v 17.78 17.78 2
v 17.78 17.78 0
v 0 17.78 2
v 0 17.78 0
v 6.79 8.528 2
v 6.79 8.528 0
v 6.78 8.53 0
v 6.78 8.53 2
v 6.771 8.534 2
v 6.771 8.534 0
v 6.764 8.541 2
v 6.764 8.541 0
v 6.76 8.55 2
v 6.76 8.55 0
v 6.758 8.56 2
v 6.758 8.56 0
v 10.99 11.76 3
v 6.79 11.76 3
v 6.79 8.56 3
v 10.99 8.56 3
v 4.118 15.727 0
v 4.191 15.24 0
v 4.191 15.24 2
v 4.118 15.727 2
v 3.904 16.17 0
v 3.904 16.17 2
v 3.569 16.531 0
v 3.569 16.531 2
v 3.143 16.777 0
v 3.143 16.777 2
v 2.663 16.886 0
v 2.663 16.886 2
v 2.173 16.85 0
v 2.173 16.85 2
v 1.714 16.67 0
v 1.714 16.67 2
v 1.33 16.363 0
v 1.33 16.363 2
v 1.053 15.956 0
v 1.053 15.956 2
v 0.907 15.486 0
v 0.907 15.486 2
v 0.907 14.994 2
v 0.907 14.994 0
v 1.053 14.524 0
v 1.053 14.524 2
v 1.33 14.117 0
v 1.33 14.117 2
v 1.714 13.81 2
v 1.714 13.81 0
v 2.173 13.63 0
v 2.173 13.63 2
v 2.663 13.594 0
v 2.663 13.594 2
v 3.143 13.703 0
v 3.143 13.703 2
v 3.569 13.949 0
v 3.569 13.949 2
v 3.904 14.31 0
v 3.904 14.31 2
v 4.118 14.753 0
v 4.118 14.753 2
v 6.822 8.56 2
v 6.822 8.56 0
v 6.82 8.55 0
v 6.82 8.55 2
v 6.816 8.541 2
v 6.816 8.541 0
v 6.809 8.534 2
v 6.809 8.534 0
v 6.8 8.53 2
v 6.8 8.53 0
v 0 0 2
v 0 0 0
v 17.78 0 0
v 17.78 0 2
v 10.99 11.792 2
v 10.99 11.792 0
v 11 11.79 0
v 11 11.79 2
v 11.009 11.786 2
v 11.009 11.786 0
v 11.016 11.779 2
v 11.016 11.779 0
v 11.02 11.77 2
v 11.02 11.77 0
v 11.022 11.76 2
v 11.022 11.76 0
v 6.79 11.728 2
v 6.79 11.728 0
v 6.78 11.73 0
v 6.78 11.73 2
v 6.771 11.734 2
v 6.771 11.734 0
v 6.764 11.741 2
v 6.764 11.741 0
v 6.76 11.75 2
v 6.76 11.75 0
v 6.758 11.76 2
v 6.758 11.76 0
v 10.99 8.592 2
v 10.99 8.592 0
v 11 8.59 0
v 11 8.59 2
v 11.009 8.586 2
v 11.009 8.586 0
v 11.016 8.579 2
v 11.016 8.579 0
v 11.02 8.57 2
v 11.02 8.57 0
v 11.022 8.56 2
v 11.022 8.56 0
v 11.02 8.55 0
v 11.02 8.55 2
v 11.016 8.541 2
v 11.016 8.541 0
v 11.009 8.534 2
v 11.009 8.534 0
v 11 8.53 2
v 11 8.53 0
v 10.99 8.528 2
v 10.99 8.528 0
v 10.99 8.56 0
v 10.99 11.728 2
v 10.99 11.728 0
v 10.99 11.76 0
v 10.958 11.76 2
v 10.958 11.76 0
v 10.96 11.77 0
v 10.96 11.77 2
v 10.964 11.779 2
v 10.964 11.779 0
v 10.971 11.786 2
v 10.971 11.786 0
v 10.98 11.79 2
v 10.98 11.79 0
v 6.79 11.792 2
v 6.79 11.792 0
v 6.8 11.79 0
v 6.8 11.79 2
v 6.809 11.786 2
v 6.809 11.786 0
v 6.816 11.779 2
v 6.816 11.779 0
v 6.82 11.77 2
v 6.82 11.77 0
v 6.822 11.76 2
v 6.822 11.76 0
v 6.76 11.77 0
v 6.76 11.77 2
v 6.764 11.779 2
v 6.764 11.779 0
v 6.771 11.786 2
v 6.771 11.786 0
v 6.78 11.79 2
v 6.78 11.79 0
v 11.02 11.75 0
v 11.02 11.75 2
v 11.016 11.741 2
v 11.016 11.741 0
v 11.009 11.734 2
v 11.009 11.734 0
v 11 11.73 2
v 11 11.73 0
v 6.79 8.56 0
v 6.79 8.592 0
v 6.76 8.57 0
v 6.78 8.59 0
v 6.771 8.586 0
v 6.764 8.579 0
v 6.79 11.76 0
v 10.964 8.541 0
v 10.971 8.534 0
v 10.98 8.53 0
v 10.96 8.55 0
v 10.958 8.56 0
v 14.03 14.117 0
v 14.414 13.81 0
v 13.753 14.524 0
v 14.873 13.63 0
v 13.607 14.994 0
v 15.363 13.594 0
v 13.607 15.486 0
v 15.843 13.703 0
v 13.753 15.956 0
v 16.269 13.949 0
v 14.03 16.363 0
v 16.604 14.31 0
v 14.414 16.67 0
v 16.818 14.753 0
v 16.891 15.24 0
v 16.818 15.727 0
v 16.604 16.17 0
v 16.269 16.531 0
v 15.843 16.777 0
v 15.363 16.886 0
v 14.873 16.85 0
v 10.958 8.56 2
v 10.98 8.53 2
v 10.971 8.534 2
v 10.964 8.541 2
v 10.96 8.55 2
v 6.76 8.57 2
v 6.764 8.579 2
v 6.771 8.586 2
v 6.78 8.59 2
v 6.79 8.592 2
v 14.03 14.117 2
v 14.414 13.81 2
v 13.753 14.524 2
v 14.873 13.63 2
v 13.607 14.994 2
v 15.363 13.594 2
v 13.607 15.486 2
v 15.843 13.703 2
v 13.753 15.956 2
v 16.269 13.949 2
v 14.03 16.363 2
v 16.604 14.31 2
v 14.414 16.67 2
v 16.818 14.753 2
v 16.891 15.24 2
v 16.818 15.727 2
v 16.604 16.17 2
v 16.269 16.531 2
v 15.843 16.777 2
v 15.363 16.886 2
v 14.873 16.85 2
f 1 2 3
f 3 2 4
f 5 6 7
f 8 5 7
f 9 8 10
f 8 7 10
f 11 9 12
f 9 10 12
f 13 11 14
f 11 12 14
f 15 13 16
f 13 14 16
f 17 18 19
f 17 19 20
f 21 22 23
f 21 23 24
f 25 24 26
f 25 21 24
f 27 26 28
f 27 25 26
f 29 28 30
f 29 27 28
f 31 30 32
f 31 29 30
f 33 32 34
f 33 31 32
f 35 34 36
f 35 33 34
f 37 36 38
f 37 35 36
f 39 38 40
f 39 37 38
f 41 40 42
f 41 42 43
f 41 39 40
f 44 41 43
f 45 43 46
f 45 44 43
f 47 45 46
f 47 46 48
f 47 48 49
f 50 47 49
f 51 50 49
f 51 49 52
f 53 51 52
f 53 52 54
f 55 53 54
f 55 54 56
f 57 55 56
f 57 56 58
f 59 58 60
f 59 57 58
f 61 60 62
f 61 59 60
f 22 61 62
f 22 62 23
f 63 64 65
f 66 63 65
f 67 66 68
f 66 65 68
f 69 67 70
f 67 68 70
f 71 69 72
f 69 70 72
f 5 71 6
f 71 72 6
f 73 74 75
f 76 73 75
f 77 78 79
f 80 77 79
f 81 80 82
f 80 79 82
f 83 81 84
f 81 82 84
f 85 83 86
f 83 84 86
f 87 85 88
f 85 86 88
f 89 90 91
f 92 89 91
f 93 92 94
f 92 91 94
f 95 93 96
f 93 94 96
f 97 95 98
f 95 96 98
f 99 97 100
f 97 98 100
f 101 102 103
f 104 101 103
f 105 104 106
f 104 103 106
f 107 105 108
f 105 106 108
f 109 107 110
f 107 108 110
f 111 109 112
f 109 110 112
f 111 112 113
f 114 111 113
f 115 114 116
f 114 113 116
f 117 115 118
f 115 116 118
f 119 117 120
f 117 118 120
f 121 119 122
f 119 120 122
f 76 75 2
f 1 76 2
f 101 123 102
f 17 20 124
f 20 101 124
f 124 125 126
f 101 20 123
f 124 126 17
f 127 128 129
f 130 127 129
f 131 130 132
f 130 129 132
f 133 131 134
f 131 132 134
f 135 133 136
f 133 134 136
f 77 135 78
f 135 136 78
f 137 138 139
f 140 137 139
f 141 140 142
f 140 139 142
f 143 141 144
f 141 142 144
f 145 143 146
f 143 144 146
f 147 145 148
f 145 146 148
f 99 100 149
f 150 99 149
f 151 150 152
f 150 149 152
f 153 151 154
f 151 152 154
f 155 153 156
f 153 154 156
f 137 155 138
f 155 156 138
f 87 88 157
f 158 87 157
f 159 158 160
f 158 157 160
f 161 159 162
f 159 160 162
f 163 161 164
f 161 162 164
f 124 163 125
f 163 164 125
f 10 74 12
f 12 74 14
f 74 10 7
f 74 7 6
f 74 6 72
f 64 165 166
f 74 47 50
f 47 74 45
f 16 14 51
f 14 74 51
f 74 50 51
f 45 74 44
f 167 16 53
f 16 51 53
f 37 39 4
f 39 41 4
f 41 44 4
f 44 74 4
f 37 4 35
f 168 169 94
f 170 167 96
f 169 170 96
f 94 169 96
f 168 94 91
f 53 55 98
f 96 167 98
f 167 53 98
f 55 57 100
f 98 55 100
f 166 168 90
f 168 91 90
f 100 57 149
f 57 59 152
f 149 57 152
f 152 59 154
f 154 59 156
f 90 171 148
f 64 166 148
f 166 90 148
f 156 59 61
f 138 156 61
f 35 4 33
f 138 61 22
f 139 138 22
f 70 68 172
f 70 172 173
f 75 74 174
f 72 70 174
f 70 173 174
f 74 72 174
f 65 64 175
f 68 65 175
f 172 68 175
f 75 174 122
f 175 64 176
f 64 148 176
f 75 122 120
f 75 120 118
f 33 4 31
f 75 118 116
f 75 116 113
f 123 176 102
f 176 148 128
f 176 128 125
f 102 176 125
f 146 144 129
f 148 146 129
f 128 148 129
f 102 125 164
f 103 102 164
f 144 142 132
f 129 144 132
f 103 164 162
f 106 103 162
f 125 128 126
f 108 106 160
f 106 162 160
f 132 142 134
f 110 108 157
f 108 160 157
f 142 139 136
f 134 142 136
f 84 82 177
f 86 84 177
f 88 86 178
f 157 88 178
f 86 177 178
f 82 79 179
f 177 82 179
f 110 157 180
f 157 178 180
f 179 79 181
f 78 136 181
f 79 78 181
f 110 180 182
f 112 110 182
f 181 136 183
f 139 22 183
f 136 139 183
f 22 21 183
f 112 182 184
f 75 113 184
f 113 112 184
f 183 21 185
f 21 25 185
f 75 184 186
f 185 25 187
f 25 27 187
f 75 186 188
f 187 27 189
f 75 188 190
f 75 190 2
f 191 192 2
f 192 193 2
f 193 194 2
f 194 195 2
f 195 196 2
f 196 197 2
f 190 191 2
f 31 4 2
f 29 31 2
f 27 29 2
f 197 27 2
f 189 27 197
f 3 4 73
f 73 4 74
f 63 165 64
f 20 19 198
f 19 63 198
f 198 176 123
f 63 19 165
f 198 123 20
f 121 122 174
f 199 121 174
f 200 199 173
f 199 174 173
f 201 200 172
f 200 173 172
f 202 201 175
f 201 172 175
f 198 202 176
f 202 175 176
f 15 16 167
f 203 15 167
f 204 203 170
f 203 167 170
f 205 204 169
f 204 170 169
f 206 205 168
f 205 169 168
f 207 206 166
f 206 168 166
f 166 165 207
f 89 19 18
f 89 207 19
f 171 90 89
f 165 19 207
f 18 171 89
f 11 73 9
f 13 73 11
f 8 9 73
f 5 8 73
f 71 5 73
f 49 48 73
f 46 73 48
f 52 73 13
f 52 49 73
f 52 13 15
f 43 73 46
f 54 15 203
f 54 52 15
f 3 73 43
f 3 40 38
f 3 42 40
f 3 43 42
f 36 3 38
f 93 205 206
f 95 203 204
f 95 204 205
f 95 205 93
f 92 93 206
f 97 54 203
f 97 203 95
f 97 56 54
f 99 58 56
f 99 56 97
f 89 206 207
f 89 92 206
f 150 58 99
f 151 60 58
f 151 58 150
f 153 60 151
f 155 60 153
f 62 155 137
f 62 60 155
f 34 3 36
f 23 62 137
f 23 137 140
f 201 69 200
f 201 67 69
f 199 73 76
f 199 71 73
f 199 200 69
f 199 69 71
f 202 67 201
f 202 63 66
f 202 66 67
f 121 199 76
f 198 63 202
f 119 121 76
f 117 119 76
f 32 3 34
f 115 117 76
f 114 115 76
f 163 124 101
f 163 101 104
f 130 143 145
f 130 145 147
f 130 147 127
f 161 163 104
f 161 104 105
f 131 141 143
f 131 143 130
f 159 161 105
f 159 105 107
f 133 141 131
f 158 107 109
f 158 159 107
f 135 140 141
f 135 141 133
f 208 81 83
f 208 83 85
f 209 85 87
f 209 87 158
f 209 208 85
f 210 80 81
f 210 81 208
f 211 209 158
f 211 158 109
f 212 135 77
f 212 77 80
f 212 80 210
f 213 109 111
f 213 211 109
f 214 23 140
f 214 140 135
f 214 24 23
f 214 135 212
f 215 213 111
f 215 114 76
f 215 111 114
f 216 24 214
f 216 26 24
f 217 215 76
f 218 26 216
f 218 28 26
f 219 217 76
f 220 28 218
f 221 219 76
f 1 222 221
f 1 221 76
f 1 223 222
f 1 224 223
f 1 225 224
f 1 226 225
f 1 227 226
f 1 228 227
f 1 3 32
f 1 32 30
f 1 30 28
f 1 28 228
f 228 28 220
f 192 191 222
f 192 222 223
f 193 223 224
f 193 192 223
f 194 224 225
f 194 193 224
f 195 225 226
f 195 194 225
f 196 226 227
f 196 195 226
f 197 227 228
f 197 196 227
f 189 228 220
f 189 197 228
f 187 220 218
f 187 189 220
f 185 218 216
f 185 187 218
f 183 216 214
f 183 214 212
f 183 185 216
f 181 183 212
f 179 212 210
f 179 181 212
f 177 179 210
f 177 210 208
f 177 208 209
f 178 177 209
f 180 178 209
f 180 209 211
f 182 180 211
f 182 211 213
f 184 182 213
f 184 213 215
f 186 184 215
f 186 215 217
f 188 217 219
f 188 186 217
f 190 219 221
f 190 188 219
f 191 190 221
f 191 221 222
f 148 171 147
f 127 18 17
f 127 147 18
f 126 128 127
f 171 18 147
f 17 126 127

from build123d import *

# Parameters (mm, degrees)
MODEL_W             = 17.78
MODEL_H             = 17.78
MODEL_R             = 1.651
BOSS_EXTRUDE1_DEPTH = 2
BOSS_EXTRUDE2_DEPTH = 3


with BuildPart() as part:
    # Model → Boss-Extrude1 (new body)
    with BuildSketch(Plane.XY):
        with Locations((8.89, 8.89)):
            Rectangle(MODEL_W, MODEL_H)
        with Locations((2.54, 15.24)):
            Circle(MODEL_R, mode=Mode.SUBTRACT)
        with BuildLine():
            Line((10.9582458, 8.5600032), (10.9899958, 8.5600032))
            Line((10.9899958, 8.5600032), (10.9899958, 8.5917532))
            ThreePointArc((10.9899958, 8.5917532), (11.01244644, 8.53755256), (10.9582458, 8.5600032))
        make_face(mode=Mode.SUBTRACT)
        with BuildLine():
            Line((10.9899958, 11.7282468), (10.9899958, 11.7599968))
            Line((10.9899958, 11.7599968), (10.9582458, 11.7599968))
            ThreePointArc((10.9582458, 11.7599968), (11.01244644, 11.78244744), (10.9899958, 11.7282468))
        make_face(mode=Mode.SUBTRACT)
        with BuildLine():
            Line((6.8217542, 11.7599968), (6.7900042, 11.7599968))
            Line((6.7900042, 11.7599968), (6.7900042, 11.7282468))
            ThreePointArc((6.7900042, 11.7282468), (6.76755356, 11.78244744), (6.8217542, 11.7599968))
        make_face(mode=Mode.SUBTRACT)
        with BuildLine():
            Line((6.7900042, 8.5917532), (6.7900042, 8.5600032))
            Line((6.7900042, 8.5600032), (6.8217542, 8.5600032))
            ThreePointArc((6.8217542, 8.5600032), (6.76755356, 8.53755256), (6.7900042, 8.5917532))
        make_face(mode=Mode.SUBTRACT)
        with Locations((15.24, 15.24)):
            Circle(MODEL_R, mode=Mode.SUBTRACT)
    extrude(amount=BOSS_EXTRUDE1_DEPTH)

    # Model<3> → Boss-Extrude2 (add)
    with BuildSketch(Plane.XY):
        Polygon((6.7900042, 8.5917532), (6.7900042, 8.5600032), (6.8217542, 8.5600032), (10.9582458, 8.5600032), (10.9899958, 8.5600032), (10.9899958, 8.5917532), (10.9899958, 11.7282468), (10.9899958, 11.7599968), (10.9582458, 11.7599968), (6.8217542, 11.7599968), (6.7900042, 11.7599968), (6.7900042, 11.7282468), align=None)
    extrude(amount=BOSS_EXTRUDE2_DEPTH)


solid = part.part
